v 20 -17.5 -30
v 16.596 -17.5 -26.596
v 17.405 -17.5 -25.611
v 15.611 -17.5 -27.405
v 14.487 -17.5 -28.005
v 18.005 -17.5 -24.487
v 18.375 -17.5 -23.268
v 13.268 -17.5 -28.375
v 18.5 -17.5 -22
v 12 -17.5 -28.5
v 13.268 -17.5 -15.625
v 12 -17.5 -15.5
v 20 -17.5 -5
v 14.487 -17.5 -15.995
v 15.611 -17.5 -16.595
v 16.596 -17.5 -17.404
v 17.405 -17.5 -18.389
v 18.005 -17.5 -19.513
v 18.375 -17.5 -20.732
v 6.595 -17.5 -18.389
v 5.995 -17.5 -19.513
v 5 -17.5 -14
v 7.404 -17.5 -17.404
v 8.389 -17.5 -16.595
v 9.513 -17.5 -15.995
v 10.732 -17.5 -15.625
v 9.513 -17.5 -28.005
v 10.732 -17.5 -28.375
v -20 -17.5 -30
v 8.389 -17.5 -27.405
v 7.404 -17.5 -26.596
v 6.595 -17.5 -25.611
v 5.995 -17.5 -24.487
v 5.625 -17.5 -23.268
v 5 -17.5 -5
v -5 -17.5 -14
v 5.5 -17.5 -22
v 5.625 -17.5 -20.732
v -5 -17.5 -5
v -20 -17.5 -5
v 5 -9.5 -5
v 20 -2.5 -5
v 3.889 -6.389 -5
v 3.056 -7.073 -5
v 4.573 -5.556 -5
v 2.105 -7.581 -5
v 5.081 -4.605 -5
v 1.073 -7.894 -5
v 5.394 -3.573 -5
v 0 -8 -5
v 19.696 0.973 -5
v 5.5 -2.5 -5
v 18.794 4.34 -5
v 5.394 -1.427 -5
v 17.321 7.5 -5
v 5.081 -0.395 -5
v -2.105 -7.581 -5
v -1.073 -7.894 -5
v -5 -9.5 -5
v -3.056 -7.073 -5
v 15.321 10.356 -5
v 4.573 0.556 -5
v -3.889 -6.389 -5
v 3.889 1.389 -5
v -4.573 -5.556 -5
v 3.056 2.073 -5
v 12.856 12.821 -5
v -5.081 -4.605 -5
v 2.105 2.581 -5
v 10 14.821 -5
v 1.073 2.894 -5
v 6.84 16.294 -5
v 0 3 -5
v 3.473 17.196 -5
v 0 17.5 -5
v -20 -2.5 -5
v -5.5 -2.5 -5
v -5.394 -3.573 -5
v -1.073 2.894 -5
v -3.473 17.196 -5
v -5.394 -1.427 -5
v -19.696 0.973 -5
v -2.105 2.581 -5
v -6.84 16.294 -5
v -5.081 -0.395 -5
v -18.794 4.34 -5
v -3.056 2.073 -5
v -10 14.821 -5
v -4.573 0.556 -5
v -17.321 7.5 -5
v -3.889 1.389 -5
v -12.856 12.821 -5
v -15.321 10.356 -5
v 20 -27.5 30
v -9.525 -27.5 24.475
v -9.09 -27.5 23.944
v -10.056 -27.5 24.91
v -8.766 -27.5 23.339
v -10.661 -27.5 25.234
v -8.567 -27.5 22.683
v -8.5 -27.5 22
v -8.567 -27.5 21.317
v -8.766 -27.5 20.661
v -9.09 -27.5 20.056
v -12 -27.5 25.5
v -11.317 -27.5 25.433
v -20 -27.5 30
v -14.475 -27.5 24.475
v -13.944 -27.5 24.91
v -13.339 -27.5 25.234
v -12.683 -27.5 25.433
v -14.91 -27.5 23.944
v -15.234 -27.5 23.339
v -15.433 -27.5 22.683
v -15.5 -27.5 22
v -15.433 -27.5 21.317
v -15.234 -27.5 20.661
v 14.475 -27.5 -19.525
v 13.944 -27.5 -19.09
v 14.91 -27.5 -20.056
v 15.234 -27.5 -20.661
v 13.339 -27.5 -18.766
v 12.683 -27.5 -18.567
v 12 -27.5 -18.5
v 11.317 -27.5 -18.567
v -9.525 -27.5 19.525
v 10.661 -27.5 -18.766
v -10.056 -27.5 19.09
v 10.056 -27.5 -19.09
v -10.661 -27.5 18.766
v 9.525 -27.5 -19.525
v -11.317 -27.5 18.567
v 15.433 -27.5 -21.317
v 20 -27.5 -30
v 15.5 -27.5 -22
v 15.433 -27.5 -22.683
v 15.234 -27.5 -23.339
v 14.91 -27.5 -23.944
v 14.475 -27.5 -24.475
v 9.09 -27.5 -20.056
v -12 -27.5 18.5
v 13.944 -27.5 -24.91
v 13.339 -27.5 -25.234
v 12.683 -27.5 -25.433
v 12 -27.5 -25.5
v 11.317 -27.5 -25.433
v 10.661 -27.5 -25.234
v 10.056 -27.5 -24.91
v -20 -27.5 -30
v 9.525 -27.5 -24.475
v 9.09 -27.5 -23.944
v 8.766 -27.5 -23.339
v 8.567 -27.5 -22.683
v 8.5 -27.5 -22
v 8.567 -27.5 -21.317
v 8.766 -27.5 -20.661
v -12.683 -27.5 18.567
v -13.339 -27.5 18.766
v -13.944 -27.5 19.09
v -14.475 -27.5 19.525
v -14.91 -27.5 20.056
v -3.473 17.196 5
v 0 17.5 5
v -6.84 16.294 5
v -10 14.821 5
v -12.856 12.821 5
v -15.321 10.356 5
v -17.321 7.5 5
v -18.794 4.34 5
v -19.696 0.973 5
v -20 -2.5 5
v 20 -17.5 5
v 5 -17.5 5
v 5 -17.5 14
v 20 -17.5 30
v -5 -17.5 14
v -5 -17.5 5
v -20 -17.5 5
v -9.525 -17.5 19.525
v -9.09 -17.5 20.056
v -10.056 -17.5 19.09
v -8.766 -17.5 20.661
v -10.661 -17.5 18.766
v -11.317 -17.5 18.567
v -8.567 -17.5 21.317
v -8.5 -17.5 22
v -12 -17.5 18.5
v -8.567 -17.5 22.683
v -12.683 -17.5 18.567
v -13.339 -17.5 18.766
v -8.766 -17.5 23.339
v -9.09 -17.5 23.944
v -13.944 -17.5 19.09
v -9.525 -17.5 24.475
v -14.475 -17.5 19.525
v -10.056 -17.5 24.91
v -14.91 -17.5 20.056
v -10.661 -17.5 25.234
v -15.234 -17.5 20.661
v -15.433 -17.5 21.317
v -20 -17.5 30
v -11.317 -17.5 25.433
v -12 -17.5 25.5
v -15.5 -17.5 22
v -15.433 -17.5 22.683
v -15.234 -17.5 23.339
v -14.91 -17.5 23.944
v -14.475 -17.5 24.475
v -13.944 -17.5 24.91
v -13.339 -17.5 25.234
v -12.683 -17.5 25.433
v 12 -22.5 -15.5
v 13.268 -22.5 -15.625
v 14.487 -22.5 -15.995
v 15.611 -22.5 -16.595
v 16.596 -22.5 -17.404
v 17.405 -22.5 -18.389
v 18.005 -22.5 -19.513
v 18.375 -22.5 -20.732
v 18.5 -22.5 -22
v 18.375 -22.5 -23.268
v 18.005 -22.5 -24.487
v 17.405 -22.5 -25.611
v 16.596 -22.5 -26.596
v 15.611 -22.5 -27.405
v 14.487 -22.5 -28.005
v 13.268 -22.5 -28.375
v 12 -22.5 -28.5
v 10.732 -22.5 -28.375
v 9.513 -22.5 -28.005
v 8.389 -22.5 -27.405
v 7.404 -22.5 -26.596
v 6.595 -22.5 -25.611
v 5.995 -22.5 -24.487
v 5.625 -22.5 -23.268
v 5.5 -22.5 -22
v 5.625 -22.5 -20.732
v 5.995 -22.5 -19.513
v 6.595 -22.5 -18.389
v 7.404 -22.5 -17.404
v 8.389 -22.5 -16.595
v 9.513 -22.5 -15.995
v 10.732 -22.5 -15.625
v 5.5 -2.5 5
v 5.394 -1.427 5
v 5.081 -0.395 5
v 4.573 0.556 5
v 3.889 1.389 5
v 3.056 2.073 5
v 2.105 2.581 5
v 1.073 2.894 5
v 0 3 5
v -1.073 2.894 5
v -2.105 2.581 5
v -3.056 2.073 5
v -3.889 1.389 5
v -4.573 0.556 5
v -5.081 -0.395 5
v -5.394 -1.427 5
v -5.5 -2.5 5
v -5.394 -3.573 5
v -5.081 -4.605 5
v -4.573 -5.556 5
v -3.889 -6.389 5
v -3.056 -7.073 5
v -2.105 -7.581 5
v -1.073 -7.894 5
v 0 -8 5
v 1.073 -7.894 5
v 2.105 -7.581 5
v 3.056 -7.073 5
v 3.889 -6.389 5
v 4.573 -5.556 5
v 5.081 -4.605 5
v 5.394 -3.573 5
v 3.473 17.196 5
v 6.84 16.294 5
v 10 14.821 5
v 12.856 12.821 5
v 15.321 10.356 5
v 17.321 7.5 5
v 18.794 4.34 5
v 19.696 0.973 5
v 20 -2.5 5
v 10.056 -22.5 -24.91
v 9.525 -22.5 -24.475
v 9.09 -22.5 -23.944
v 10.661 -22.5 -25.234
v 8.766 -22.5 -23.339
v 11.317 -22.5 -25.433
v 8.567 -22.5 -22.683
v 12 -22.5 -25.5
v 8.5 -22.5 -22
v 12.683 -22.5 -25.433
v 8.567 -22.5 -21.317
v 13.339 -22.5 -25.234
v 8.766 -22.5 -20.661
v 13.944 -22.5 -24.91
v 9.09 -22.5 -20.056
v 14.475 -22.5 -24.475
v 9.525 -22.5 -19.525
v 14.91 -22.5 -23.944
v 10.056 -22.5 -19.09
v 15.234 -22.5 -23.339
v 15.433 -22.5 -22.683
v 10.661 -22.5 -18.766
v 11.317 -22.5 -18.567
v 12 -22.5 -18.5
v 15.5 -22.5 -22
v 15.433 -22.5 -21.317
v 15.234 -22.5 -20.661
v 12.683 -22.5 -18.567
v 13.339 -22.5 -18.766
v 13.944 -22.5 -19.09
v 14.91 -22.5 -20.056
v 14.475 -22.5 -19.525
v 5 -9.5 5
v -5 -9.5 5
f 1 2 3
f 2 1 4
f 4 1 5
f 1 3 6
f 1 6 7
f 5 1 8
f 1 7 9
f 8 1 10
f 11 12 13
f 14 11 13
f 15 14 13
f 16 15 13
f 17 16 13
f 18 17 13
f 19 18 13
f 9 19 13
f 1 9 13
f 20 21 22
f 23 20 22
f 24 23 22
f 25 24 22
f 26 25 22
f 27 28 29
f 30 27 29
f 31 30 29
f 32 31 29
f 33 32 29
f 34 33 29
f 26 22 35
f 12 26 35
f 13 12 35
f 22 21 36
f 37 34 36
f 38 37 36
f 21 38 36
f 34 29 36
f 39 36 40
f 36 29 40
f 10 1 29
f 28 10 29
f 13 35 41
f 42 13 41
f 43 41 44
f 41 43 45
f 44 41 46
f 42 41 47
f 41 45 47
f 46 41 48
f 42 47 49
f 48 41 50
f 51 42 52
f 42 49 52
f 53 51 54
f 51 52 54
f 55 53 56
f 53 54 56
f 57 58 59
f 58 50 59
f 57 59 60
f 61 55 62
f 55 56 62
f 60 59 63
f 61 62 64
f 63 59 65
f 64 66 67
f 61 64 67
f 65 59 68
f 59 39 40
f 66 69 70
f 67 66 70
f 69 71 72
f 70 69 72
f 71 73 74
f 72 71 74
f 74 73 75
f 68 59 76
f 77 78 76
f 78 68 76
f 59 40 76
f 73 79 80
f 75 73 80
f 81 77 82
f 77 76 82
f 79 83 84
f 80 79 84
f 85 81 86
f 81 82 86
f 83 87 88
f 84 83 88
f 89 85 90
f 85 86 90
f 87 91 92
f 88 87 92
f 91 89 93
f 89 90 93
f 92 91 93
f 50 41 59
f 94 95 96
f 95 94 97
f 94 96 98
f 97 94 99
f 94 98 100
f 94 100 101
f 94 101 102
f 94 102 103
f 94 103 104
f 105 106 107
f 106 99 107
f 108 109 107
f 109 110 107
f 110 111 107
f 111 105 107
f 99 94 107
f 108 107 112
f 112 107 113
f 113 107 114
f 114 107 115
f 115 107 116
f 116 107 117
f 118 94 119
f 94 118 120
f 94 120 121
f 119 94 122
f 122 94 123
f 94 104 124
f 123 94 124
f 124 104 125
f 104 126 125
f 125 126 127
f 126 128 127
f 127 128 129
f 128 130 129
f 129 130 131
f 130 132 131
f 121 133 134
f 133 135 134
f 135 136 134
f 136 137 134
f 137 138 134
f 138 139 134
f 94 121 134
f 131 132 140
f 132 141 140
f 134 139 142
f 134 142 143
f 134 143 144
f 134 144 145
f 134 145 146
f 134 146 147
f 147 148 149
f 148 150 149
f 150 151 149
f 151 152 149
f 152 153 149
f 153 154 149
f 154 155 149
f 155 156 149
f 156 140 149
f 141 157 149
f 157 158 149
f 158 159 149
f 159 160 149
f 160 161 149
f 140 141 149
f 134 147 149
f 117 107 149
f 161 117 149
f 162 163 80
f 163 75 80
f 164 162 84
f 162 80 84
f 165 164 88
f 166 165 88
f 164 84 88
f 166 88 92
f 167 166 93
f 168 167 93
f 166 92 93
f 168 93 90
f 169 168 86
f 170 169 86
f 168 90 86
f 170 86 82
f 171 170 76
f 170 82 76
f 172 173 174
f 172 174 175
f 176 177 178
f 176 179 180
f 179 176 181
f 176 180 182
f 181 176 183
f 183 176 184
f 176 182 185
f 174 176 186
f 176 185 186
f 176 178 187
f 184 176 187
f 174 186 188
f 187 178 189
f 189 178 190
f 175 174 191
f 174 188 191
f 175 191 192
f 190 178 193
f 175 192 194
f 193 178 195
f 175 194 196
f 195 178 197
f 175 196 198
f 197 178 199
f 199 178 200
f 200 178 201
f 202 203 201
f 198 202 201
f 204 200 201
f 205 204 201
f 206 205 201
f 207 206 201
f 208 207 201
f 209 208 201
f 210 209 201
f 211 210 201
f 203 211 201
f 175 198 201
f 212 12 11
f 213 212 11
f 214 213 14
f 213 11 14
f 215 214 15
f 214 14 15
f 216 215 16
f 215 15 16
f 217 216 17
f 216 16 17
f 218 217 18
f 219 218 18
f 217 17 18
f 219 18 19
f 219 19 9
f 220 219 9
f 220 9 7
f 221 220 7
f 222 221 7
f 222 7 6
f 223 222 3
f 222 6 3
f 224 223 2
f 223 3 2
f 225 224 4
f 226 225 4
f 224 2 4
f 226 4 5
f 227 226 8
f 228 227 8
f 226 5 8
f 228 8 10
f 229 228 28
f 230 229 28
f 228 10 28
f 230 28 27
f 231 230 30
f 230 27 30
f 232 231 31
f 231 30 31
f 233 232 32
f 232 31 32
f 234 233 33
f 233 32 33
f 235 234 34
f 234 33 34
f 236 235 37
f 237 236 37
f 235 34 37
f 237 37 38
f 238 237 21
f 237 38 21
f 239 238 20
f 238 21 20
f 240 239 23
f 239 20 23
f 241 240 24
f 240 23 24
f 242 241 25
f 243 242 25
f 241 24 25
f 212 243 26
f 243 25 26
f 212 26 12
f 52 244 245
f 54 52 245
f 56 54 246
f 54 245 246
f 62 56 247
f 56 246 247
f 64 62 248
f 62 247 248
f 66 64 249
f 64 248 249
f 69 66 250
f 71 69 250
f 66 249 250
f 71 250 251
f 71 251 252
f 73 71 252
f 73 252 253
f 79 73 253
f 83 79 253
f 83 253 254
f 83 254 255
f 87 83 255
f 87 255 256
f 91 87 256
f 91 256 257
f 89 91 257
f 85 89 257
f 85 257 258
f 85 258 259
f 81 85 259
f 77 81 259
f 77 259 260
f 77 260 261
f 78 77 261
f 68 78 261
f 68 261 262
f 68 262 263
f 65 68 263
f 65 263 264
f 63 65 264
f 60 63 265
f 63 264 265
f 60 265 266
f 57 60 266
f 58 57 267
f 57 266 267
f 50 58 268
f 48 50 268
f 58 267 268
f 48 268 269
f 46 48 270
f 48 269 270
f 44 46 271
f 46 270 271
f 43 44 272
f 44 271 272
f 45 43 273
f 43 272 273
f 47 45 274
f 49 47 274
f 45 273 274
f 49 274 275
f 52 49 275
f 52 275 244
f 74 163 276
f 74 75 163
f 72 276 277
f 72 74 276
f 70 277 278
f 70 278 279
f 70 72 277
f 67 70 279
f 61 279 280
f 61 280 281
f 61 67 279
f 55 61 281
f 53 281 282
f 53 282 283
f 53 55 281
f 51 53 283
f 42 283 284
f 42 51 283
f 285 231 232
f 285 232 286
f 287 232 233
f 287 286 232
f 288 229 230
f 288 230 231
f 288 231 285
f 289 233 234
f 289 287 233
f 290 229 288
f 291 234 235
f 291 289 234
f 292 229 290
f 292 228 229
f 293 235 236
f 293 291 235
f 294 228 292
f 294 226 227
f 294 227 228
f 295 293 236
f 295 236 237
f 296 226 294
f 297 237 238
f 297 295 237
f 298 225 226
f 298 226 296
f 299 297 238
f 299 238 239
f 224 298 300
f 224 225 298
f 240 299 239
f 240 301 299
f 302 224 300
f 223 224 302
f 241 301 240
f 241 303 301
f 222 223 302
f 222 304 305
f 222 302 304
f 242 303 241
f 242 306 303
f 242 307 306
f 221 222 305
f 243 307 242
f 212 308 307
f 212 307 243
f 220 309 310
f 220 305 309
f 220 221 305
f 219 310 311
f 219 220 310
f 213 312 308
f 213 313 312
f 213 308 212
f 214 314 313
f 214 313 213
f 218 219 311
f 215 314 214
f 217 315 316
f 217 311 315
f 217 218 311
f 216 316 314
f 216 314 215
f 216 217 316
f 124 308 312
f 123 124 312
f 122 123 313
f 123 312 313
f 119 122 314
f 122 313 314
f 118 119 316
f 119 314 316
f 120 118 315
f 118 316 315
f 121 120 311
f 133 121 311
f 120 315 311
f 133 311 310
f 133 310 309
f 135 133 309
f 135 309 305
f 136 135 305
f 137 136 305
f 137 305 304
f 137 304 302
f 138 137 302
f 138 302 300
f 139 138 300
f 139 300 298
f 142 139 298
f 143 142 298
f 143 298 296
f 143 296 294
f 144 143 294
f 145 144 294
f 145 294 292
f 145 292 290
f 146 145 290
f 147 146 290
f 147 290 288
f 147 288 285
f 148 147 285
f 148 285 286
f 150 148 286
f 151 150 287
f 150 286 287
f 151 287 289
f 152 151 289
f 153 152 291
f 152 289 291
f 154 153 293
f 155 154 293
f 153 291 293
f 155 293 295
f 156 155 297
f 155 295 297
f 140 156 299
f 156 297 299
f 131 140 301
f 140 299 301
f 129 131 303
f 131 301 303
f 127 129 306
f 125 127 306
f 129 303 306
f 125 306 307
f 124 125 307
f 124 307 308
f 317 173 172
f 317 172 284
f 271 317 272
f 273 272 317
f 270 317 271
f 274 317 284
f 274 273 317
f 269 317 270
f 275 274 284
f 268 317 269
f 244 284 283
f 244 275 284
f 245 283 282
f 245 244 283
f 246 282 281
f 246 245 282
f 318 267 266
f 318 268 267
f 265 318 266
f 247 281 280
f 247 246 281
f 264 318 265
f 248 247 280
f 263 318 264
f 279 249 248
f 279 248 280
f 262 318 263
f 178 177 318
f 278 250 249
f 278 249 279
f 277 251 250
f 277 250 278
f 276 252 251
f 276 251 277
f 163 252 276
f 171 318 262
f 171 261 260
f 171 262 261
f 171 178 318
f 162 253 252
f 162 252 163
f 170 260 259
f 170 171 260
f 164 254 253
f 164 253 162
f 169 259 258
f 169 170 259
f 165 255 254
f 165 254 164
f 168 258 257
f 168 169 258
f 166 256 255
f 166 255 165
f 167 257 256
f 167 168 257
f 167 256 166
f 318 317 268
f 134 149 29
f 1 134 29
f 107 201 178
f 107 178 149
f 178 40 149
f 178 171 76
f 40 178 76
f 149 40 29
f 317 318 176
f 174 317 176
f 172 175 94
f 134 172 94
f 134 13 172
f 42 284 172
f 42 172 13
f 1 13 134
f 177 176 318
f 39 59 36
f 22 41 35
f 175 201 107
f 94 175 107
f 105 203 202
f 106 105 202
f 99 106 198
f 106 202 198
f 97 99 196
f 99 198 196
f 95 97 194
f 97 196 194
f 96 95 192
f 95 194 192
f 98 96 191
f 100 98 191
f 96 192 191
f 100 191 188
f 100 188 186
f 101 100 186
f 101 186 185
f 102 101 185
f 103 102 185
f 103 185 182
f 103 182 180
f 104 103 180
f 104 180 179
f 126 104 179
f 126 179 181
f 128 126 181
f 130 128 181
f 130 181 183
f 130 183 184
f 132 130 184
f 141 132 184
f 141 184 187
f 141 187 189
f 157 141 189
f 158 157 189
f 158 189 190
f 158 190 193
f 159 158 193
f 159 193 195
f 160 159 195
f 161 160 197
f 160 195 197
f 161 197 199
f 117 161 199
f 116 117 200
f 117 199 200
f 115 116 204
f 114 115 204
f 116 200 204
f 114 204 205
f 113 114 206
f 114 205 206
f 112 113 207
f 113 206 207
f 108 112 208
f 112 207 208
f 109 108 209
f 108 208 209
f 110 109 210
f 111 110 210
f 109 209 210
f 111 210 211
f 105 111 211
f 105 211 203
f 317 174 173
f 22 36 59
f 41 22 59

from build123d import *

# Parameters (mm, degrees)
EXTRUDE_1_DEPTH      = 20
EXTRUDE_1_DEPTH_BACK = 20
SKETCH_1_W           = 10
SKETCH_1_H           = 35
FILLET_1_R           = 20
SKETCH_2_R           = 5.5
CUT_EXTRUDE_1_DEPTH  = 49.79805324
EXTRUDE_2_DEPTH      = 5
EXTRUDE_2_DEPTH_BACK = 5
SKETCH_3_R           = 3.5
CUT_EXTRUDE_2_DEPTH  = 51.249378106
SKETCH_4_R           = 6.5
CUT_EXTRUDE_3_DEPTH  = 5


with BuildPart() as part:
    # Эскиз1 → Бобышка-Вытянуть1 (new, two sides: drawn at the far end of the back side and taken through both)
    with BuildSketch(Plane(origin=(0, 0, 0), x_dir=(0, 0, -1), z_dir=(1, 0, 0)).offset(-EXTRUDE_1_DEPTH_BACK)):
        Rectangle(SKETCH_1_W, SKETCH_1_H)
        Polygon((-5, -17.5), (-14, -17.5), (-30, -17.5), (-30, -27.5), (30, -27.5), (30, -17.5), (14, -17.5), (5, -17.5), align=None)
    extrude(amount=EXTRUDE_1_DEPTH + EXTRUDE_1_DEPTH_BACK)

    # Скругление1
    fillet_1_edges = [part.edges().sort_by_distance(p)[0] for p in [
        (-20, 17.5, 0),
        (20, 17.5, 0),
    ]]
    fillet(fillet_1_edges, radius=FILLET_1_R - 0.0001)  # a hair under: the kernel refuses the full size

    # Эскиз2 → Вырез-Вытянуть1 (cut, through all)
    with BuildSketch(Plane.XY.offset(5)):
        with Locations((0, -2.5)):
            Circle(SKETCH_2_R)
    extrude(amount=-CUT_EXTRUDE_1_DEPTH, mode=Mode.SUBTRACT)

    # Эскиз1<3> → Бобышка-Вытянуть2 (add, two sides: drawn at the far end of the back side and taken through both)
    with BuildSketch(Plane(origin=(0, 0, 0), x_dir=(0, 0, -1), z_dir=(1, 0, 0)).offset(-EXTRUDE_2_DEPTH_BACK)):
        Polygon((-5, -9.5), (-14, -17.5), (-5, -17.5), align=None)
        Polygon((5, -9.5), (5, -17.5), (14, -17.5), align=None)
    extrude(amount=EXTRUDE_2_DEPTH + EXTRUDE_2_DEPTH_BACK)

    # Эскиз3 → Вырез-Вытянуть2 (cut, through all)
    with BuildSketch(Plane(origin=(0, -17.5, 0), x_dir=(1, 0, 0), z_dir=(0, 1, 0))):
        with Locations(Location((-12, -22, 0), (0, 0, 270))):
            Circle(SKETCH_3_R)
        with Locations(Location((12, 22, 0), (0, 0, 270))):
            Circle(SKETCH_3_R)
    extrude(amount=-CUT_EXTRUDE_2_DEPTH, mode=Mode.SUBTRACT)

    # Эскиз4 → Вырез-Вытянуть3 (cut)
    with BuildSketch(Plane(origin=(0, -17.5, 0), x_dir=(1, 0, 0), z_dir=(0, 1, 0))):
        with Locations(Location((12, 22, 0), (0, 0, 270))):
            Circle(SKETCH_4_R)
    extrude(amount=-CUT_EXTRUDE_3_DEPTH, mode=Mode.SUBTRACT)


solid = part.part
